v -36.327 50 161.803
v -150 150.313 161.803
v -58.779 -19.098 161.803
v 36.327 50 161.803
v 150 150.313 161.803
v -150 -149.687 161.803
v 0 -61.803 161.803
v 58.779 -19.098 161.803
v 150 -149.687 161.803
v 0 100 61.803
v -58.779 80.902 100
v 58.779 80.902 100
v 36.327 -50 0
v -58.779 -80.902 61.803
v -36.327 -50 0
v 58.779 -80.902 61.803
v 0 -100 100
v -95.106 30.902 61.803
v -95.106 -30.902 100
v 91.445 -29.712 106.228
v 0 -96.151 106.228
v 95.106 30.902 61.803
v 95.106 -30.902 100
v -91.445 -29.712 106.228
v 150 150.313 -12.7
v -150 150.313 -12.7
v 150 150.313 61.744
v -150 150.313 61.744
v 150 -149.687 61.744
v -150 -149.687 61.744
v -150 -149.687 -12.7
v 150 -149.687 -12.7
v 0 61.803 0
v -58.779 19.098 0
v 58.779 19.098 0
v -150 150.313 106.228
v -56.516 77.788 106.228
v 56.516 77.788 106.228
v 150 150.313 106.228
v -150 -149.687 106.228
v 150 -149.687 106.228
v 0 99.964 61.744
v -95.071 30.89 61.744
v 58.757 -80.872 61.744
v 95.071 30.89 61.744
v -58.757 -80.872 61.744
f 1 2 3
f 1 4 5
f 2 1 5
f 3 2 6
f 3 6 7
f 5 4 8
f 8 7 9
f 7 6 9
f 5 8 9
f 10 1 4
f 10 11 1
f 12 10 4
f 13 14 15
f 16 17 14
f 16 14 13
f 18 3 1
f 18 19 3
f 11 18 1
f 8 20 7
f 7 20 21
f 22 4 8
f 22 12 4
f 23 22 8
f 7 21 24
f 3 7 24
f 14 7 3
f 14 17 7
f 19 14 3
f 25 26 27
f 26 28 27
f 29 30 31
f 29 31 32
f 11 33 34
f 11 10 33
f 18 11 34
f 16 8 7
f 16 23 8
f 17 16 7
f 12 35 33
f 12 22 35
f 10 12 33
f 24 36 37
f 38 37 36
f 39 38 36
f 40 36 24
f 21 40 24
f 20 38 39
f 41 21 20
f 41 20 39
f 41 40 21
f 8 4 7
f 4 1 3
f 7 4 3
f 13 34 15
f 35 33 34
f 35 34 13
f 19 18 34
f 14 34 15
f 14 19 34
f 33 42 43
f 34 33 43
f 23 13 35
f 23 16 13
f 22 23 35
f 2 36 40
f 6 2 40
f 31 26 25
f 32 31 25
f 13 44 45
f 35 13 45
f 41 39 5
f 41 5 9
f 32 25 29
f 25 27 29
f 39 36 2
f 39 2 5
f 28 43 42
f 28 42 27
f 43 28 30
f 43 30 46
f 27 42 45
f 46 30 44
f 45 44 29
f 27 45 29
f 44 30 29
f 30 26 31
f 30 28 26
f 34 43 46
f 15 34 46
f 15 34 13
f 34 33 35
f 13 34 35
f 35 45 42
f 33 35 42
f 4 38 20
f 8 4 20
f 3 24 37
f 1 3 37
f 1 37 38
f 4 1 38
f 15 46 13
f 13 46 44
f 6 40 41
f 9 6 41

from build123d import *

# Parameters (mm, degrees)
F5_DEPTH       = 40
F6_DEPTH       = 120
F7_COUNT       = 5
F7_ANGLE       = 288
F8_ANGLE       = 180
F9_ANGLE       = 36
F11_W          = 300
F11_H          = 300
F12_DEPTH      = 61.7444068193
F12_DEPTH_BACK = 12.7
F14_START      = -106.2278673053
F14_DEPTH      = 55.5755315373


with BuildPart() as f5:
    # F0 (on Top) → F5 (new body)
    with BuildSketch(Plane.XY):
        Polygon((58.7785252292, 19.0983005625), (0, 61.803398875), (-58.7785252292, 19.0983005625), (-36.3271264003, -50), (36.3271264003, -50), align=None)
    extrude(amount=F5_DEPTH)


with BuildPart() as f6:
    # F3 (on 3pt) → F6 (new body)
    with BuildSketch(Plane(origin=(0, -39.999999984, -20.000000012), x_dir=(1, 0, 0), z_dir=(0, -0.8944271908, -0.4472135959))):
        Polygon((-36.3271264003, 22.3606797929), (36.3271264003, 22.3606797929), (58.7785252292, 91.4589803554), (0, 134.1640786679), (-58.7785252292, 91.4589803554), align=None)
    extrude(amount=-F6_DEPTH)


with BuildPart() as f7_1:
    # F7: instance of F6
    add(f6.part.rotate(Axis((0, 0, 25.4806555621), (0, 0, 1)), 1 * F7_ANGLE / (F7_COUNT - 1)))


with BuildPart() as f7_2:
    # F7: instance of F6
    add(f6.part.rotate(Axis((0, 0, 25.4806555621), (0, 0, 1)), 2 * F7_ANGLE / (F7_COUNT - 1)))


with BuildPart() as f7_3:
    # F7: instance of F6
    add(f6.part.rotate(Axis((0, 0, 25.4806555621), (0, 0, 1)), 3 * F7_ANGLE / (F7_COUNT - 1)))


with BuildPart() as f7_4:
    # F7: instance of F6
    add(f6.part.rotate(Axis((0, 0, 25.4806555621), (0, 0, 1)), 4 * F7_ANGLE / (F7_COUNT - 1)))


with BuildPart() as f8_1:
    # F8: copy of F5
    add(f5.part.rotate(Axis((0, -14.3237254381, 80.9016994213), (0, 1, 0)), F8_ANGLE))


with BuildPart() as f8_2:
    # F8: copy of F6
    add(f6.part.rotate(Axis((0, -14.3237254381, 80.9016994213), (0, 1, 0)), F8_ANGLE))


with BuildPart() as f8_3:
    # F8: copy of F7_1
    add(f7_1.part.rotate(Axis((0, -14.3237254381, 80.9016994213), (0, 1, 0)), F8_ANGLE))


with BuildPart() as f8_4:
    # F8: copy of F7_2
    add(f7_2.part.rotate(Axis((0, -14.3237254381, 80.9016994213), (0, 1, 0)), F8_ANGLE))


with BuildPart() as f8_5:
    # F8: copy of F7_3
    add(f7_3.part.rotate(Axis((0, -14.3237254381, 80.9016994213), (0, 1, 0)), F8_ANGLE))


with BuildPart() as f8_6:
    # F8: copy of F7_4
    add(f7_4.part.rotate(Axis((0, -14.3237254381, 80.9016994213), (0, 1, 0)), F8_ANGLE))


with BuildPart() as f8_4_1:
    # F9: moved
    add(f8_4.part.rotate(Axis((0, 0, 25.4806555621), (0, 0, 1)), F9_ANGLE))


with BuildPart() as f8_3_1:
    # F9: moved
    add(f8_3.part.rotate(Axis((0, 0, 25.4806555621), (0, 0, 1)), F9_ANGLE))


with BuildPart() as f8_2_1:
    # F9: moved
    add(f8_2.part.rotate(Axis((0, 0, 25.4806555621), (0, 0, 1)), F9_ANGLE))


with BuildPart() as f8_6_1:
    # F9: moved
    add(f8_6.part.rotate(Axis((0, 0, 25.4806555621), (0, 0, 1)), F9_ANGLE))


with BuildPart() as f8_5_1:
    # F9: moved
    add(f8_5.part.rotate(Axis((0, 0, 25.4806555621), (0, 0, 1)), F9_ANGLE))


with BuildPart() as f8_1_1:
    # F9: moved
    add(f8_1.part.rotate(Axis((0, 0, 25.4806555621), (0, 0, 1)), F9_ANGLE))


with BuildPart() as f5_1:
    add(f5.part)

    # F10: union F6, F7_1, F7_2, F7_3, F7_4, F8_1, F8_2, F8_3, F8_4, F8_5, F8_6
    add(f6.part)
    add(f7_1.part)
    add(f7_2.part)
    add(f7_3.part)
    add(f7_4.part)
    add(f8_1_1.part)
    add(f8_2_1.part)
    add(f8_3_1.part)
    add(f8_4_1.part)
    add(f8_5_1.part)
    add(f8_6_1.part)


with BuildPart() as f12:
    # F11 (on face) → F12 (new body, two sides)
    with BuildSketch(Plane(origin=(0, 0, 0), x_dir=(1, 0, 0), z_dir=(0, 0, -1))) as f12_sk:
        with Locations((0, -0.3129541874)):
            Rectangle(F11_W, F11_H)
        Polygon((58.7785252292, -19.0983005625), (0, -61.803398875), (-58.7785252292, -19.0983005625), (-36.3271264003, 50), (36.3271264003, 50), align=None, mode=Mode.SUBTRACT)
        Polygon((-58.7785252292, -19.0983005625), (0, -61.803398875), (58.7785252292, -19.0983005625), (36.3271264003, 50), (-36.3271264003, 50), align=None)
    extrude(amount=-F12_DEPTH)
    extrude(f12_sk.sketch, amount=F12_DEPTH_BACK)

    # F13: cut F5
    add(f5_1.part, mode=Mode.SUBTRACT)


with BuildPart() as f14:
    # F11 (on face) → F14 (new body)
    with BuildSketch(Plane(origin=(0, 0, 0), x_dir=(1, 0, 0), z_dir=(0, 0, -1)).offset(F14_START)):
        with Locations((0, -0.3129541874)):
            Rectangle(F11_W, F11_H)
    extrude(amount=-F14_DEPTH)

    # F15: cut F5
    add(f5_1.part, mode=Mode.SUBTRACT)


solid = Compound([f5_1.part, f12.part, f14.part])
